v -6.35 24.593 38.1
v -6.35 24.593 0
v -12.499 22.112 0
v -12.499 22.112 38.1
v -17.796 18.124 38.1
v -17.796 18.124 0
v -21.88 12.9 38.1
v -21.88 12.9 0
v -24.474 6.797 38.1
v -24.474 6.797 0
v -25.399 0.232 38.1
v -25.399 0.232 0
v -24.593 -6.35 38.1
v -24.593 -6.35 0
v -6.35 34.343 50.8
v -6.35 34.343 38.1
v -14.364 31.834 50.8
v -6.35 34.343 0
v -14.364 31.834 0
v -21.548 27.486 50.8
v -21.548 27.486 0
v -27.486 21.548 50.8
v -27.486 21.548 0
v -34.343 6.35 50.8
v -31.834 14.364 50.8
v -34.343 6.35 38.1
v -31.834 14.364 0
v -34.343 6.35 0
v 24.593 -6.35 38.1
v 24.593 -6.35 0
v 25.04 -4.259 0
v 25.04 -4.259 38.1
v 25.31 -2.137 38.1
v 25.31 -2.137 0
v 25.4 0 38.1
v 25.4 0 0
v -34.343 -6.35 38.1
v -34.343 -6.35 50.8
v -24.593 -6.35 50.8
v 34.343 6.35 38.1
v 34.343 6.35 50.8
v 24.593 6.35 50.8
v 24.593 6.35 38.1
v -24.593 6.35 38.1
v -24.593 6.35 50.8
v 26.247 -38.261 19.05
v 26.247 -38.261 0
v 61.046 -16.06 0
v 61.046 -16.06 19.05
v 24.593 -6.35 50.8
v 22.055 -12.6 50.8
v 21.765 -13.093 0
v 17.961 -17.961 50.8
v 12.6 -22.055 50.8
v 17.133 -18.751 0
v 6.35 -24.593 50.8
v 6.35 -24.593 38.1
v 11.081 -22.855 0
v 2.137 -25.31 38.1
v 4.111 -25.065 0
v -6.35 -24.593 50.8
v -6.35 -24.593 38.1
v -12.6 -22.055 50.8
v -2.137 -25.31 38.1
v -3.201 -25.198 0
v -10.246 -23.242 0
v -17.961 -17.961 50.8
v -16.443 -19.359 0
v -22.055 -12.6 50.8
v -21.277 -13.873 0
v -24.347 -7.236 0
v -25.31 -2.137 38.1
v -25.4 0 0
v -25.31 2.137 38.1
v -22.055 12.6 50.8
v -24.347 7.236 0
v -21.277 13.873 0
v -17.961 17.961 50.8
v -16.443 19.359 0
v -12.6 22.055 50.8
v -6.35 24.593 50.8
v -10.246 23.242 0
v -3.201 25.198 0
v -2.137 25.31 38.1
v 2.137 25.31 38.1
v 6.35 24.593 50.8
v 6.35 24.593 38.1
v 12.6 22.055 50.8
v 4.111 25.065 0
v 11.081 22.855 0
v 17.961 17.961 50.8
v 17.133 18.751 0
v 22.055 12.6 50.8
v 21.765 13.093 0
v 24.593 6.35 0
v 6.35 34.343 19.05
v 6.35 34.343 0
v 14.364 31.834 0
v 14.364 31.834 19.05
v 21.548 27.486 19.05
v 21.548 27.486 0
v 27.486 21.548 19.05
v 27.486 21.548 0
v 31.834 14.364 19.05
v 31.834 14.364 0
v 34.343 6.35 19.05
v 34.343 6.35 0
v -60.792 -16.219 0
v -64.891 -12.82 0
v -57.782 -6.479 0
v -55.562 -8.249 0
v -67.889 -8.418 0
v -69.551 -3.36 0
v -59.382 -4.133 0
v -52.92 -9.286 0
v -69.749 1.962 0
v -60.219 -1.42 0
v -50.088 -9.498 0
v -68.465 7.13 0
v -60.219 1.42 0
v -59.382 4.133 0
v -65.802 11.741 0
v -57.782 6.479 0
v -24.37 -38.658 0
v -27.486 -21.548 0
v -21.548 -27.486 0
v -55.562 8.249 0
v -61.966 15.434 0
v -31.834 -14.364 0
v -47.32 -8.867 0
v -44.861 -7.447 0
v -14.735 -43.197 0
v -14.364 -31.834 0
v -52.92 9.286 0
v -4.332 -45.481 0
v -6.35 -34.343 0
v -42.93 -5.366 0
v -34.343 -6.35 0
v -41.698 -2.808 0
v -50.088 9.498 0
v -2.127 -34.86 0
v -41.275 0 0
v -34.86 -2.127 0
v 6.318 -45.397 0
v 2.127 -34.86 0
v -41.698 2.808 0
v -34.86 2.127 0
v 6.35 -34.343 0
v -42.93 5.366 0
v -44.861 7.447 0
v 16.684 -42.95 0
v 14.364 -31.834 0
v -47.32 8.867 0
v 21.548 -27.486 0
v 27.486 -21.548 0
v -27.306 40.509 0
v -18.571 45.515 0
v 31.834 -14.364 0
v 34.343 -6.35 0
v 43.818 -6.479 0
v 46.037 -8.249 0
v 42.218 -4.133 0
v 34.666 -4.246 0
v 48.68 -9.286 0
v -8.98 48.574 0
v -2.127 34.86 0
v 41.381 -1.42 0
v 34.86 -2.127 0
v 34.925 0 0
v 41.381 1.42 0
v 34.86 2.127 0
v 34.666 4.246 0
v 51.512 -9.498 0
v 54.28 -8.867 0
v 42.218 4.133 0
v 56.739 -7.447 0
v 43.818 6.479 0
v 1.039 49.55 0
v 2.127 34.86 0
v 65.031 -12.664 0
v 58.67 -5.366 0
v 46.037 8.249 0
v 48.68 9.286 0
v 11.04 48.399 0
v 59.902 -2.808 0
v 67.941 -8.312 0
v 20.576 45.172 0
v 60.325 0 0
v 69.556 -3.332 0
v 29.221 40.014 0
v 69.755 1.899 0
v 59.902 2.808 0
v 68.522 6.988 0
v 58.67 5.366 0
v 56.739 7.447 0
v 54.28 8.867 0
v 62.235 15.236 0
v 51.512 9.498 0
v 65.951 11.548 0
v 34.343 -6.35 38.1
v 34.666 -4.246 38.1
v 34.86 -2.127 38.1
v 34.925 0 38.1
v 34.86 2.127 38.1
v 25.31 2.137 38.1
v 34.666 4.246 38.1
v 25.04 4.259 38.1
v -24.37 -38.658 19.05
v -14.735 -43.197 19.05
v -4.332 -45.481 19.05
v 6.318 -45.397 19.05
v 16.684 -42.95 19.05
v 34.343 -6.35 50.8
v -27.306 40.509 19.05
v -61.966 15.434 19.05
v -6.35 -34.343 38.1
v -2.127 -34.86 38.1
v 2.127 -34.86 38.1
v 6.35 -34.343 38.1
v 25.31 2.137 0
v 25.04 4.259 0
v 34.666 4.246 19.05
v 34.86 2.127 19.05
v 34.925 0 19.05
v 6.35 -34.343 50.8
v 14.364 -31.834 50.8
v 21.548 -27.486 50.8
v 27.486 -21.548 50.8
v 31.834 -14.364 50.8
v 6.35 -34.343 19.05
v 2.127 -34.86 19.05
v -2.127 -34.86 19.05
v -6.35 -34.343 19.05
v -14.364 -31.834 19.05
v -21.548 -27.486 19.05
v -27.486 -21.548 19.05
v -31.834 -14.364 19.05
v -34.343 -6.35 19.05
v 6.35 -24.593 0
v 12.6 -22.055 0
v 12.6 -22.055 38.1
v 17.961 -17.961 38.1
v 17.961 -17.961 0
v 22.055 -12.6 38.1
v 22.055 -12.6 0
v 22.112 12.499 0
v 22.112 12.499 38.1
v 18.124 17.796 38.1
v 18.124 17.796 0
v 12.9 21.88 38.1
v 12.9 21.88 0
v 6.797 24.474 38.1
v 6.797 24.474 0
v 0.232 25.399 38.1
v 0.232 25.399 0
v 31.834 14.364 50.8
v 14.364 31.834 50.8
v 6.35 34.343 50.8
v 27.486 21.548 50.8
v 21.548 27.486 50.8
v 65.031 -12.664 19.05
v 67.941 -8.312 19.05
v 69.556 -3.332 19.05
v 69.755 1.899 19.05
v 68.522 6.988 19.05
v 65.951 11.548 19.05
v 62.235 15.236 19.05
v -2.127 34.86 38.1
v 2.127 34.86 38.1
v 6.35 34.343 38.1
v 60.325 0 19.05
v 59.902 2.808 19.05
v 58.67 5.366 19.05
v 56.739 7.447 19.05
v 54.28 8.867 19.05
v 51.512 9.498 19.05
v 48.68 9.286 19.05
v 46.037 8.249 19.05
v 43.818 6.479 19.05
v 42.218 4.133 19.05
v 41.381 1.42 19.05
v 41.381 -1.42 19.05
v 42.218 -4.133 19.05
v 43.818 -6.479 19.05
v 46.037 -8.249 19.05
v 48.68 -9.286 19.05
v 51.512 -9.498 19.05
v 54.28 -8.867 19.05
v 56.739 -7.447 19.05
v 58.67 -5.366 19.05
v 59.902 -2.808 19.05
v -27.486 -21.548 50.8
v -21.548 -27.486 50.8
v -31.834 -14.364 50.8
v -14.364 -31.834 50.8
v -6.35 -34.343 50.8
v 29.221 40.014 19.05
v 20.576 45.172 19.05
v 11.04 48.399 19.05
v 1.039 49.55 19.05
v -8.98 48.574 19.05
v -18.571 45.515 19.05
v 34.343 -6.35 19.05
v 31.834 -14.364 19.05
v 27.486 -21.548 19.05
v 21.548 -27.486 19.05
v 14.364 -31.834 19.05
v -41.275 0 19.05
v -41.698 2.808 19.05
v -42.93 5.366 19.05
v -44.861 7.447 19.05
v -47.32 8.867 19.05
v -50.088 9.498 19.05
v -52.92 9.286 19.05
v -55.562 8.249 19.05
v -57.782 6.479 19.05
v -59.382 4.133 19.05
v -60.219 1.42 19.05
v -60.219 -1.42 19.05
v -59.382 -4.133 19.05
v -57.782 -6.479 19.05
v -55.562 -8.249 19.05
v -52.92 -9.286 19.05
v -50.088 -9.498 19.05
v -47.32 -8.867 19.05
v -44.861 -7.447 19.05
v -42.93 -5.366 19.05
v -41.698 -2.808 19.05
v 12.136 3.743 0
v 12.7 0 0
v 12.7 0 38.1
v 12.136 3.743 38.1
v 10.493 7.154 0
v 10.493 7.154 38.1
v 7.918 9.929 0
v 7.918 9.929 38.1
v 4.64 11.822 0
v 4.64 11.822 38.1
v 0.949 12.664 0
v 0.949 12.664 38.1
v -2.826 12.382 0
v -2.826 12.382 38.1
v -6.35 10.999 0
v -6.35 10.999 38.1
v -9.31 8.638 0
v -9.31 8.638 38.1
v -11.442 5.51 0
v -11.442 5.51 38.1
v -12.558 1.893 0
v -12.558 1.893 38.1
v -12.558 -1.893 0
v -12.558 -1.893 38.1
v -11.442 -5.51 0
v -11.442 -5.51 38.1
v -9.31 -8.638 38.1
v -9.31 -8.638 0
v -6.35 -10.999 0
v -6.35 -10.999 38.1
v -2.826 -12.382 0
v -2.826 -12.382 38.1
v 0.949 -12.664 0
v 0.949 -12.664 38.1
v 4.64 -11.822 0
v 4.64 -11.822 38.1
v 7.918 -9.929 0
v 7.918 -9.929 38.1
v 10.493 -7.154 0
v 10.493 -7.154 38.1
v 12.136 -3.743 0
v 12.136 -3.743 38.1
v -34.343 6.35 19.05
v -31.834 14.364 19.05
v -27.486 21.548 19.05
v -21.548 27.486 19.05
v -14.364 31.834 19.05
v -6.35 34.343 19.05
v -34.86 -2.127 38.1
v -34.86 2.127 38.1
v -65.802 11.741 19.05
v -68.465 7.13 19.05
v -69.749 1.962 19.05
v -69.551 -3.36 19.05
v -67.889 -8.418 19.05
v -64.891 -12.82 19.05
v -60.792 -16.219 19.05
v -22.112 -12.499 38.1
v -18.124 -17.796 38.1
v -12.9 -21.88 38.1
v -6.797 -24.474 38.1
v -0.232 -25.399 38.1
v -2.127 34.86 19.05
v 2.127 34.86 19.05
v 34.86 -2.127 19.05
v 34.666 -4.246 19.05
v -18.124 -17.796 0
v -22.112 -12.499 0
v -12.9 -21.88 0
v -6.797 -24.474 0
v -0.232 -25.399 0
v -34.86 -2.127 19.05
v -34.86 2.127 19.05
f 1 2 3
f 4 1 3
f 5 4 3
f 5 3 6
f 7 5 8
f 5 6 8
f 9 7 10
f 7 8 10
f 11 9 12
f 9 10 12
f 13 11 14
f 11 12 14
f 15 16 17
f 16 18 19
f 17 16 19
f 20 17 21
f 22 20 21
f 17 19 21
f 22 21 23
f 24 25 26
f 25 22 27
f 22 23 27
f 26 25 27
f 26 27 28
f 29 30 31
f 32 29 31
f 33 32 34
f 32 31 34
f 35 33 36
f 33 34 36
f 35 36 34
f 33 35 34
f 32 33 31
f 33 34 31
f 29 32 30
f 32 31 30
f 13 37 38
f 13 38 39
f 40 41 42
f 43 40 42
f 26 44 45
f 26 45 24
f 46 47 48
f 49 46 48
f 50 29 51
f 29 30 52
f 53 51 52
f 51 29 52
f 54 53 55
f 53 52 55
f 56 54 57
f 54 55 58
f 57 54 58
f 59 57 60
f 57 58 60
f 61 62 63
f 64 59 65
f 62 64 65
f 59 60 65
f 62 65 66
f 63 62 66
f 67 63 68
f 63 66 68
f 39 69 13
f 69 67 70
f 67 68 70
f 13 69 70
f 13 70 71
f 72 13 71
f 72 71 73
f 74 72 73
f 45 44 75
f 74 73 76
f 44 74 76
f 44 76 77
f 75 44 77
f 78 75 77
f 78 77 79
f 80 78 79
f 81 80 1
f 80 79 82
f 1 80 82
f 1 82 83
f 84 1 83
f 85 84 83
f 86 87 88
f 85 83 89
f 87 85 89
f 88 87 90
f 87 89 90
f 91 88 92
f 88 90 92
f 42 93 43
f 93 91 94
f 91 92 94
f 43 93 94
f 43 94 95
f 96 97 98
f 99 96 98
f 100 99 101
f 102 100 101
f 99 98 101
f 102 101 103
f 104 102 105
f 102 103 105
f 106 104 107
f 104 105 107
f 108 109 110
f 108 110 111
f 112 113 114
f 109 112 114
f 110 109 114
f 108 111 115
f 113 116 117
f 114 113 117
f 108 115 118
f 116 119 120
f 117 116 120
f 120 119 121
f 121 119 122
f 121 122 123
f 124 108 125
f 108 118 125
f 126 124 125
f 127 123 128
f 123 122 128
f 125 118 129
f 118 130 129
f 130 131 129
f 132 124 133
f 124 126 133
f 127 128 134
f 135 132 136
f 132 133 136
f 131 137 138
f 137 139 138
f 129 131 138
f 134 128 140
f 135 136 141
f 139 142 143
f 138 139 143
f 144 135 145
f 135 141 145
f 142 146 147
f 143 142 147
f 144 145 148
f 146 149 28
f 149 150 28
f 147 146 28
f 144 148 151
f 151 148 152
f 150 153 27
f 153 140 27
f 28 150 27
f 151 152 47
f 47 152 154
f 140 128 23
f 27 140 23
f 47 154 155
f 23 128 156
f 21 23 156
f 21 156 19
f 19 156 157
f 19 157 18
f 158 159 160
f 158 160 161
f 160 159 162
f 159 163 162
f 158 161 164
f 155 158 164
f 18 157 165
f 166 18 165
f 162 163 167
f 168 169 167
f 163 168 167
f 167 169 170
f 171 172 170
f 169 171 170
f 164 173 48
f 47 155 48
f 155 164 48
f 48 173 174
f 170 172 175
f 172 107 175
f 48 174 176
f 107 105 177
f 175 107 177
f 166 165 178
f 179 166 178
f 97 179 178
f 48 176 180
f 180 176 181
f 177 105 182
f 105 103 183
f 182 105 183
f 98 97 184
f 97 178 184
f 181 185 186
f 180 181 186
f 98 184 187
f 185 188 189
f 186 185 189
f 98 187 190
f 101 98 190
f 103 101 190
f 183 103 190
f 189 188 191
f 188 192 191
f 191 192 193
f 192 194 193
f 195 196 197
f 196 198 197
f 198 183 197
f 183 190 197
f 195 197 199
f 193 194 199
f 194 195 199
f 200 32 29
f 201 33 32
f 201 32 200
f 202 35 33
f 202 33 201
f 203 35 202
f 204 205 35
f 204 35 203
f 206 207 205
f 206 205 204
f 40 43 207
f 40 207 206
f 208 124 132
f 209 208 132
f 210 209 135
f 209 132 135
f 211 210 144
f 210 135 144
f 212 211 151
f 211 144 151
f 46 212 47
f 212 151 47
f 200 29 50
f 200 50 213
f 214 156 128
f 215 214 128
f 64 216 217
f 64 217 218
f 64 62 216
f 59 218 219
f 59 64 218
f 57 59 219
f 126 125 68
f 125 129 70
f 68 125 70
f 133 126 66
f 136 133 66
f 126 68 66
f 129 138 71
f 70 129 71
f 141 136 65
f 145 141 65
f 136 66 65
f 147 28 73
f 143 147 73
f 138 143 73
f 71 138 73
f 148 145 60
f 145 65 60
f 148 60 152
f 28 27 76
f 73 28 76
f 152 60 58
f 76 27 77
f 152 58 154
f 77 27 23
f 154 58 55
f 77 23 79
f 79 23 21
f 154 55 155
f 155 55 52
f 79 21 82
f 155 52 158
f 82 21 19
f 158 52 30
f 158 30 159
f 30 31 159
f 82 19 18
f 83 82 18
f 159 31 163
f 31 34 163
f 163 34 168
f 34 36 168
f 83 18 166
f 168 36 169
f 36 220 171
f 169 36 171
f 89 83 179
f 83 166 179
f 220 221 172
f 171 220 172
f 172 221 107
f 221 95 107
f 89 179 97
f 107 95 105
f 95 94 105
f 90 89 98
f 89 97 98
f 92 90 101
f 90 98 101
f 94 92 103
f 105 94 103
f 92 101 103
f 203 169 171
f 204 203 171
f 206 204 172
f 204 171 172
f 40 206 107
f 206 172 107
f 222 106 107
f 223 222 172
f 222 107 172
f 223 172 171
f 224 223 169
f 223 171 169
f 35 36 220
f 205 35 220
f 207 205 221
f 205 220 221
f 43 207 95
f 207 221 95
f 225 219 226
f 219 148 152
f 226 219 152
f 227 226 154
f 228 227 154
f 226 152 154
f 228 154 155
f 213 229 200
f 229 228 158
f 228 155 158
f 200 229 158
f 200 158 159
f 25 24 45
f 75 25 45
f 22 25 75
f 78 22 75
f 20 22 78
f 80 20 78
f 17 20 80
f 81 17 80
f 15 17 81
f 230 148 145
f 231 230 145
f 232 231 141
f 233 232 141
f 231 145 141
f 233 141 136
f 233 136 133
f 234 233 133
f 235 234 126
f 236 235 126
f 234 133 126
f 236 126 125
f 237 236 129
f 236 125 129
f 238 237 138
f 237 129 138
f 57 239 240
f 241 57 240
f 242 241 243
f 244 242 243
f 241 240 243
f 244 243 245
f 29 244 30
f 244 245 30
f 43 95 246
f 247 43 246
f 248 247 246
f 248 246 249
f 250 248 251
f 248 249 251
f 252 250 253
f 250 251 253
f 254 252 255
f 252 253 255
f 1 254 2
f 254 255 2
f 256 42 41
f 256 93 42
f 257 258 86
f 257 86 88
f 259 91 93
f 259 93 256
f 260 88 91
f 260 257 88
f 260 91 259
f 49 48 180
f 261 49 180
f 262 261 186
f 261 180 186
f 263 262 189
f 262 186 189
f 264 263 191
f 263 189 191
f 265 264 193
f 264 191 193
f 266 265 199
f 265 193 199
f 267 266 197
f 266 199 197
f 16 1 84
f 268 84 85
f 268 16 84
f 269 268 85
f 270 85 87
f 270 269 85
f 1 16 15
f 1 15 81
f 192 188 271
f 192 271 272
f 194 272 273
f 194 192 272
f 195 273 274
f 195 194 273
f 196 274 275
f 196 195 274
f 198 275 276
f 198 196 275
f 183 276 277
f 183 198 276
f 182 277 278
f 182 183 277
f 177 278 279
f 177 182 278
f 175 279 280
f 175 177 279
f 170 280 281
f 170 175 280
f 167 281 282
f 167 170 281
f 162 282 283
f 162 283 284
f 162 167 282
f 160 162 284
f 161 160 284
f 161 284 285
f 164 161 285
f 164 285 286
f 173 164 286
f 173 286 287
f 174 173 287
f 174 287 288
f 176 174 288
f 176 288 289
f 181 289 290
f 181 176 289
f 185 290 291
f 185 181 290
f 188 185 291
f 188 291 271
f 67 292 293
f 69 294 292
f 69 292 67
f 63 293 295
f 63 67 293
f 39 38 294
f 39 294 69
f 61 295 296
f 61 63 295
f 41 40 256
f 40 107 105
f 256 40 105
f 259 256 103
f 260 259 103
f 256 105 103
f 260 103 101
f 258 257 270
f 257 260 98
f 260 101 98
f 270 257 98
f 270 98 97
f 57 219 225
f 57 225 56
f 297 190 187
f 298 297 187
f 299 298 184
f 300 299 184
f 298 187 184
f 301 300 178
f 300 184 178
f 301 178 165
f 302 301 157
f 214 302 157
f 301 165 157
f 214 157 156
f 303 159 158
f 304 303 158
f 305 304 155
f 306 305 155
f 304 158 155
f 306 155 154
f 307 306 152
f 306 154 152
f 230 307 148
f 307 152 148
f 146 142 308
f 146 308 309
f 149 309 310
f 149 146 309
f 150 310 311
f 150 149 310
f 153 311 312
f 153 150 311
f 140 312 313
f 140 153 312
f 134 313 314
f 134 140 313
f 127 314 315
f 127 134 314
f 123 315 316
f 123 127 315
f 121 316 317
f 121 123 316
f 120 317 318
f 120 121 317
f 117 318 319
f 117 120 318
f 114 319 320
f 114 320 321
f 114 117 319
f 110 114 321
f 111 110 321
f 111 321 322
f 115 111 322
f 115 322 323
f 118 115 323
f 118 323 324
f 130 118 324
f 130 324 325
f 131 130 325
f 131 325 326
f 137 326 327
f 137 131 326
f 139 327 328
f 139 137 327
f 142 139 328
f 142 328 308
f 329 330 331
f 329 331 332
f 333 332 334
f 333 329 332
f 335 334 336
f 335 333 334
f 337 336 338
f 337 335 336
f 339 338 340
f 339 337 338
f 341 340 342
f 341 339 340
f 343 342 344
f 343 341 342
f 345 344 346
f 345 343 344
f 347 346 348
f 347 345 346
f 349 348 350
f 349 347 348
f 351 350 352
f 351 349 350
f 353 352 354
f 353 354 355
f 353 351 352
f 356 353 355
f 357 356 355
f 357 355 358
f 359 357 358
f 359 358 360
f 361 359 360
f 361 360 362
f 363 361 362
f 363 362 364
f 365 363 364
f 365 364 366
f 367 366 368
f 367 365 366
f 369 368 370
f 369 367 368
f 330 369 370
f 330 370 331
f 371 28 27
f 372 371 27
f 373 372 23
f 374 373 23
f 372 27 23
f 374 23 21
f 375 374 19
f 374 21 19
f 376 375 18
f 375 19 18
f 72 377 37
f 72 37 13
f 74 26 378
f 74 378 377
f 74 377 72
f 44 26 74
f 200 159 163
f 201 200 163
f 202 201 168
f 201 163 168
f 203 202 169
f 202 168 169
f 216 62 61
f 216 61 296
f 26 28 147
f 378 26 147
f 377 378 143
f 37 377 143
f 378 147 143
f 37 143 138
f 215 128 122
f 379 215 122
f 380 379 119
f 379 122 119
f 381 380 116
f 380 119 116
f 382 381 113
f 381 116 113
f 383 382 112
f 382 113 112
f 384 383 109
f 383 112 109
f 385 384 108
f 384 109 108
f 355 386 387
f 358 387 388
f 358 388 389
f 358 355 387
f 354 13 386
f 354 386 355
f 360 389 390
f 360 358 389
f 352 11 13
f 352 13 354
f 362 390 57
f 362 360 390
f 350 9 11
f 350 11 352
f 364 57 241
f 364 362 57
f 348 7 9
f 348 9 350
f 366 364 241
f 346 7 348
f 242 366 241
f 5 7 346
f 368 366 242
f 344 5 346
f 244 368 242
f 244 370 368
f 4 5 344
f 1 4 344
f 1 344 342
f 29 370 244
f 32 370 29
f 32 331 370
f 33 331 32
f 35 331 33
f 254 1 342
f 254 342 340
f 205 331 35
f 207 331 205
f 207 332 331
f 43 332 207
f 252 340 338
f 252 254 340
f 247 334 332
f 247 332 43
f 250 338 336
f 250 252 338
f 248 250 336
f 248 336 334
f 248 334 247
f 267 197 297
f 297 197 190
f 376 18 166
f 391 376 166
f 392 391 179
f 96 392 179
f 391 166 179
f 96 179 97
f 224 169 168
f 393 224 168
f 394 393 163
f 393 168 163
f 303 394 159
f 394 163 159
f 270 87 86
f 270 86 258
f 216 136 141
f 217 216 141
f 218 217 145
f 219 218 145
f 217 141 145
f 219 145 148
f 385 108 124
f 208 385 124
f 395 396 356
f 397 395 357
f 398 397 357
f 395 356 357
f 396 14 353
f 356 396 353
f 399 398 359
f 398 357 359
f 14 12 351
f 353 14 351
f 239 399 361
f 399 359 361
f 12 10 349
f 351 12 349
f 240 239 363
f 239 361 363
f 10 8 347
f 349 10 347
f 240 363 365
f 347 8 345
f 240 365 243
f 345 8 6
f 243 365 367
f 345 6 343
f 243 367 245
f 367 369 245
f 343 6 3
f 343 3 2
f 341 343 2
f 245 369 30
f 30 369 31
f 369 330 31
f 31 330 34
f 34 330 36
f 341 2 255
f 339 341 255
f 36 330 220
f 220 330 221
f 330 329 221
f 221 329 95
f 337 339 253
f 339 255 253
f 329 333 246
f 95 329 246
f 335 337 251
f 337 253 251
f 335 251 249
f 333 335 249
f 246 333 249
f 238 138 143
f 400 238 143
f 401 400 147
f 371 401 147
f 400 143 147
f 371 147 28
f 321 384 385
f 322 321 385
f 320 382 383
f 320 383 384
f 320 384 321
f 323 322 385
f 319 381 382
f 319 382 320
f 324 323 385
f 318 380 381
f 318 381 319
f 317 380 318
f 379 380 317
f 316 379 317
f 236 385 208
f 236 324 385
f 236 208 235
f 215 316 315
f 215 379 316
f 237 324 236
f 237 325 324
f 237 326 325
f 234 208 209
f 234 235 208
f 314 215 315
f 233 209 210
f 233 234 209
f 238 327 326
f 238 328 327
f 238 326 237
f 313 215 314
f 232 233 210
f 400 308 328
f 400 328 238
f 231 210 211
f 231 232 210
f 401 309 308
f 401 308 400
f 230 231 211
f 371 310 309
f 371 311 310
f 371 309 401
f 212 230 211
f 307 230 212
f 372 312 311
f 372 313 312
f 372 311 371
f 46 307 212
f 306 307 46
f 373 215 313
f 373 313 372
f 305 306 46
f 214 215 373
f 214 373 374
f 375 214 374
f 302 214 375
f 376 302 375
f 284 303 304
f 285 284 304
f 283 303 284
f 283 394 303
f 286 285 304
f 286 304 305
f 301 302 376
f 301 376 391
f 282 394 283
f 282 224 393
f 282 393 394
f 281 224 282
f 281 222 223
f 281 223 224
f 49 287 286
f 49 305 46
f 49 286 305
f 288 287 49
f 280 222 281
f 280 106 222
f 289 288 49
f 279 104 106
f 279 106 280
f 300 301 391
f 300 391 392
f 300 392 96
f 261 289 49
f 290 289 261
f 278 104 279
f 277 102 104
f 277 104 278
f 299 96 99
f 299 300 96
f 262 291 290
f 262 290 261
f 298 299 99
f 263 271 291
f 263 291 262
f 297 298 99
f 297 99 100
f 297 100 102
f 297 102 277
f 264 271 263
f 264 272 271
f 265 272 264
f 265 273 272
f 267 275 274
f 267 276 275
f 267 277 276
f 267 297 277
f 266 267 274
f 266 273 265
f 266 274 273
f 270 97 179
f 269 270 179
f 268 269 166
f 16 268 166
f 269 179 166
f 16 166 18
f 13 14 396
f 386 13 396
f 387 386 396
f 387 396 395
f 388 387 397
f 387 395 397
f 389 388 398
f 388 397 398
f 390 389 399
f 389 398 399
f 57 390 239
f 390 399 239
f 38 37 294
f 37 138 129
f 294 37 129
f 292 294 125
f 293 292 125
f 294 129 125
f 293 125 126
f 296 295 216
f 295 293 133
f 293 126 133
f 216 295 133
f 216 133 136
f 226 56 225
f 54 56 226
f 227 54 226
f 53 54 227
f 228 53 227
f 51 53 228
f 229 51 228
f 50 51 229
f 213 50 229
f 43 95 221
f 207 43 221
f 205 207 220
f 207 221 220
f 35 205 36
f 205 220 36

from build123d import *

# Parameters (mm, degrees)
F0_R     = 9.525
F1_DEPTH = 19.05
F0_R_2   = 12.7
F2_DEPTH = 38.1
F3_DEPTH = 50.8
F5_DEPTH = 12.7


with BuildPart() as f1:
    # F0 (on Top) → F1 (new body)
    with BuildSketch(Plane.XY):
        with BuildLine():
            Line((-27.3056187604, 40.5092964203), (-61.9659784878, 15.4344881486))
            ThreePointArc((-61.9659784878, 15.4344881486), (-69.8369205733, -0.7058010235), (-60.7924155452, -16.2189436022))
            Line((-60.7924155452, -16.2189436022), (-24.3704484388, -38.6583477475))
            ThreePointArc((-24.3704484388, -38.6583477475), (0.9955179359, -45.7375661979), (26.2471685991, -38.2608207318))
            Line((26.2471685991, -38.2608207318), (61.0459192334, -16.0600012162))
            ThreePointArc((61.0459192334, -16.0600012162), (69.8362654294, -0.7232554874), (62.2349758625, 15.2362668335))
            Line((62.2349758625, 15.2362668335), (29.2210898111, 40.0135298109))
            ThreePointArc((29.2210898111, 40.0135298109), (1.0392021113, 49.5501346169), (-27.3056187604, 40.5092964203))
        make_face()
        with Locations((-50.8, 0)):
            Circle(F0_R, mode=Mode.SUBTRACT)
        with BuildLine():
            ThreePointArc((34.3428758988, 6.35), (34.7791644937, 3.1883133656), (34.925, 0))
            ThreePointArc((34.925, 0), (34.7791644937, -3.1883133656), (34.3428758988, -6.35))
            ThreePointArc((34.3428758988, -6.35), (24.6957043329, -24.6957043329), (6.35, -34.3428758988))
            ThreePointArc((6.35, -34.3428758988), (0, -34.925), (-6.35, -34.3428758988))
            ThreePointArc((-6.35, -34.3428758988), (-24.6957043329, -24.6957043329), (-34.3428758988, -6.35))
            ThreePointArc((-34.3428758988, -6.35), (-34.925, 0), (-34.3428758988, 6.35))
            ThreePointArc((-34.3428758988, 6.35), (-24.6957043329, 24.6957043329), (-6.35, 34.3428758988))
            ThreePointArc((-6.35, 34.3428758988), (0, 34.925), (6.35, 34.3428758988))
            ThreePointArc((6.35, 34.3428758988), (24.6957043329, 24.6957043329), (34.3428758988, 6.35))
        make_face(mode=Mode.SUBTRACT)
        with Locations((50.8, 0)):
            Circle(F0_R, mode=Mode.SUBTRACT)
    extrude(amount=F1_DEPTH)


with BuildPart() as f2:
    # F0 (on Top) → F2 (new body)
    with BuildSketch(Plane.XY):
        with BuildLine():
            ThreePointArc((25.4, 0), (25.1975542852, 3.2005090291), (24.5934442484, 6.35))
            ThreePointArc((24.5934442484, 6.35), (17.9605122421, 17.9605122421), (6.35, 24.5934442484))
            ThreePointArc((6.35, 24.5934442484), (0, 25.4), (-6.35, 24.5934442484))
            ThreePointArc((-6.35, 24.5934442484), (-17.9605122421, 17.9605122421), (-24.5934442484, 6.35))
            ThreePointArc((-24.5934442484, 6.35), (-25.4, 0), (-24.5934442484, -6.35))
            ThreePointArc((-24.5934442484, -6.35), (-17.9605122421, -17.9605122421), (-6.35, -24.5934442484))
            ThreePointArc((-6.35, -24.5934442484), (0, -25.4), (6.35, -24.5934442484))
            ThreePointArc((6.35, -24.5934442484), (17.9605122421, -17.9605122421), (24.5934442484, -6.35))
            ThreePointArc((24.5934442484, -6.35), (25.1975542852, -3.2005090291), (25.4, 0))
        make_face()
        Circle(F0_R_2, mode=Mode.SUBTRACT)
    extrude(amount=F2_DEPTH)


with BuildPart() as f3:
    # F0 (on Top) → F3 (new body)
    with BuildSketch(Plane.XY):
        with BuildLine():
            Line((30.4367747158, 6.35), (34.3428758988, 6.35))
            ThreePointArc((34.3428758988, 6.35), (24.6957043329, 24.6957043329), (6.35, 34.3428758988))
            Line((6.35, 34.3428758988), (6.35, 30.61629273))
            Line((6.35, 30.61629273), (6.35, 24.5934442484))
            ThreePointArc((6.35, 24.5934442484), (17.9605122421, 17.9605122421), (24.5934442484, 6.35))
            Line((24.5934442484, 6.35), (30.4367747158, 6.35))
        make_face()
        with BuildLine():
            Line((6.35, 30.61629273), (6.35, 34.3428758988))
            ThreePointArc((6.35, 34.3428758988), (0, 34.925), (-6.35, 34.3428758988))
            Line((-6.35, 34.3428758988), (-6.35, 30.61629273))
            Line((-6.35, 30.61629273), (-6.35, 24.5934442484))
            ThreePointArc((-6.35, 24.5934442484), (0, 25.4), (6.35, 24.5934442484))
            Line((6.35, 24.5934442484), (6.35, 30.61629273))
        make_face()
        with BuildLine():
            Line((-6.35, 30.61629273), (-6.35, 34.3428758988))
            ThreePointArc((-6.35, 34.3428758988), (-24.6957043329, 24.6957043329), (-34.3428758988, 6.35))
            Line((-34.3428758988, 6.35), (-30.105708167, 6.35))
            Line((-30.105708167, 6.35), (-24.5934442484, 6.35))
            ThreePointArc((-24.5934442484, 6.35), (-17.9605122421, 17.9605122421), (-6.35, 24.5934442484))
            Line((-6.35, 24.5934442484), (-6.35, 30.61629273))
        make_face()
        with BuildLine():
            Line((-30.105708167, 6.35), (-34.3428758988, 6.35))
            ThreePointArc((-34.3428758988, 6.35), (-34.925, 0), (-34.3428758988, -6.35))
            Line((-34.3428758988, -6.35), (-30.105708167, -6.35))
            Line((-30.105708167, -6.35), (-24.5934442484, -6.35))
            ThreePointArc((-24.5934442484, -6.35), (-25.4, 0), (-24.5934442484, 6.35))
            Line((-24.5934442484, 6.35), (-30.105708167, 6.35))
        make_face()
        with BuildLine():
            ThreePointArc((-34.3428758988, -6.35), (-24.6957043329, -24.6957043329), (-6.35, -34.3428758988))
            Line((-6.35, -34.3428758988), (-6.35, -30.5674783885))
            Line((-6.35, -30.5674783885), (-6.35, -24.5934442484))
            ThreePointArc((-6.35, -24.5934442484), (-17.9605122421, -17.9605122421), (-24.5934442484, -6.35))
            Line((-24.5934442484, -6.35), (-30.105708167, -6.35))
            Line((-30.105708167, -6.35), (-34.3428758988, -6.35))
        make_face()
        with BuildLine():
            ThreePointArc((-6.35, -34.3428758988), (0, -34.925), (6.35, -34.3428758988))
            Line((6.35, -34.3428758988), (6.35, -30.5674783885))
            Line((6.35, -30.5674783885), (6.35, -24.5934442484))
            ThreePointArc((6.35, -24.5934442484), (0, -25.4), (-6.35, -24.5934442484))
            Line((-6.35, -24.5934442484), (-6.35, -30.5674783885))
            Line((-6.35, -30.5674783885), (-6.35, -34.3428758988))
        make_face()
        with BuildLine():
            ThreePointArc((6.35, -34.3428758988), (24.6957043329, -24.6957043329), (34.3428758988, -6.35))
            Line((34.3428758988, -6.35), (30.4367747158, -6.35))
            Line((30.4367747158, -6.35), (24.5934442484, -6.35))
            ThreePointArc((24.5934442484, -6.35), (17.9605122421, -17.9605122421), (6.35, -24.5934442484))
            Line((6.35, -24.5934442484), (6.35, -30.5674783885))
            Line((6.35, -30.5674783885), (6.35, -34.3428758988))
        make_face()
        with BuildLine():
            ThreePointArc((34.3428758988, -6.35), (34.7791644937, -3.1883133656), (34.925, 0))
            ThreePointArc((34.925, 0), (34.7791644937, 3.1883133656), (34.3428758988, 6.35))
            Line((34.3428758988, 6.35), (30.4367747158, 6.35))
            Line((30.4367747158, 6.35), (24.5934442484, 6.35))
            ThreePointArc((24.5934442484, 6.35), (25.1975542852, 3.2005090291), (25.4, 0))
            ThreePointArc((25.4, 0), (25.1975542852, -3.2005090291), (24.5934442484, -6.35))
            Line((24.5934442484, -6.35), (30.4367747158, -6.35))
            Line((30.4367747158, -6.35), (34.3428758988, -6.35))
        make_face()
    extrude(amount=F3_DEPTH)

    # F4 (on face) → F5 (cut)
    with BuildSketch(Plane.XY.offset(50.8)):
        with BuildLine():
            ThreePointArc((-6.35, -34.3428758988), (0, -34.925), (6.35, -34.3428758988))
            Line((6.35, -34.3428758988), (6.35, -24.5934442484))
            ThreePointArc((6.35, -24.5934442484), (0, -25.4), (-6.35, -24.5934442484))
            Line((-6.35, -24.5934442484), (-6.35, -34.3428758988))
        make_face()
        with BuildLine():
            Line((-24.5934442484, 6.35), (-34.3428758988, 6.35))
            ThreePointArc((-34.3428758988, 6.35), (-34.925, 0), (-34.3428758988, -6.35))
            Line((-34.3428758988, -6.35), (-24.5934442484, -6.35))
            ThreePointArc((-24.5934442484, -6.35), (-25.4, 0), (-24.5934442484, 6.35))
        make_face()
        with BuildLine():
            Line((6.35, 24.5934442484), (6.35, 34.3428758988))
            ThreePointArc((6.35, 34.3428758988), (0, 34.925), (-6.35, 34.3428758988))
            Line((-6.35, 34.3428758988), (-6.35, 24.5934442484))
            ThreePointArc((-6.35, 24.5934442484), (0, 25.4), (6.35, 24.5934442484))
        make_face()
        with BuildLine():
            ThreePointArc((34.925, 0), (34.7791644937, 3.1883133656), (34.3428758988, 6.35))
            Line((34.3428758988, 6.35), (24.5934442484, 6.35))
            ThreePointArc((24.5934442484, 6.35), (25.1975542852, 3.2005090291), (25.4, 0))
            ThreePointArc((25.4, 0), (25.1975542852, -3.2005090291), (24.5934442484, -6.35))
            Line((24.5934442484, -6.35), (34.3428758988, -6.35))
            ThreePointArc((34.3428758988, -6.35), (34.7791644937, -3.1883133656), (34.925, 0))
        make_face()
    extrude(amount=-F5_DEPTH, mode=Mode.SUBTRACT)


solid = Compound([f1.part, f2.part, f3.part])
